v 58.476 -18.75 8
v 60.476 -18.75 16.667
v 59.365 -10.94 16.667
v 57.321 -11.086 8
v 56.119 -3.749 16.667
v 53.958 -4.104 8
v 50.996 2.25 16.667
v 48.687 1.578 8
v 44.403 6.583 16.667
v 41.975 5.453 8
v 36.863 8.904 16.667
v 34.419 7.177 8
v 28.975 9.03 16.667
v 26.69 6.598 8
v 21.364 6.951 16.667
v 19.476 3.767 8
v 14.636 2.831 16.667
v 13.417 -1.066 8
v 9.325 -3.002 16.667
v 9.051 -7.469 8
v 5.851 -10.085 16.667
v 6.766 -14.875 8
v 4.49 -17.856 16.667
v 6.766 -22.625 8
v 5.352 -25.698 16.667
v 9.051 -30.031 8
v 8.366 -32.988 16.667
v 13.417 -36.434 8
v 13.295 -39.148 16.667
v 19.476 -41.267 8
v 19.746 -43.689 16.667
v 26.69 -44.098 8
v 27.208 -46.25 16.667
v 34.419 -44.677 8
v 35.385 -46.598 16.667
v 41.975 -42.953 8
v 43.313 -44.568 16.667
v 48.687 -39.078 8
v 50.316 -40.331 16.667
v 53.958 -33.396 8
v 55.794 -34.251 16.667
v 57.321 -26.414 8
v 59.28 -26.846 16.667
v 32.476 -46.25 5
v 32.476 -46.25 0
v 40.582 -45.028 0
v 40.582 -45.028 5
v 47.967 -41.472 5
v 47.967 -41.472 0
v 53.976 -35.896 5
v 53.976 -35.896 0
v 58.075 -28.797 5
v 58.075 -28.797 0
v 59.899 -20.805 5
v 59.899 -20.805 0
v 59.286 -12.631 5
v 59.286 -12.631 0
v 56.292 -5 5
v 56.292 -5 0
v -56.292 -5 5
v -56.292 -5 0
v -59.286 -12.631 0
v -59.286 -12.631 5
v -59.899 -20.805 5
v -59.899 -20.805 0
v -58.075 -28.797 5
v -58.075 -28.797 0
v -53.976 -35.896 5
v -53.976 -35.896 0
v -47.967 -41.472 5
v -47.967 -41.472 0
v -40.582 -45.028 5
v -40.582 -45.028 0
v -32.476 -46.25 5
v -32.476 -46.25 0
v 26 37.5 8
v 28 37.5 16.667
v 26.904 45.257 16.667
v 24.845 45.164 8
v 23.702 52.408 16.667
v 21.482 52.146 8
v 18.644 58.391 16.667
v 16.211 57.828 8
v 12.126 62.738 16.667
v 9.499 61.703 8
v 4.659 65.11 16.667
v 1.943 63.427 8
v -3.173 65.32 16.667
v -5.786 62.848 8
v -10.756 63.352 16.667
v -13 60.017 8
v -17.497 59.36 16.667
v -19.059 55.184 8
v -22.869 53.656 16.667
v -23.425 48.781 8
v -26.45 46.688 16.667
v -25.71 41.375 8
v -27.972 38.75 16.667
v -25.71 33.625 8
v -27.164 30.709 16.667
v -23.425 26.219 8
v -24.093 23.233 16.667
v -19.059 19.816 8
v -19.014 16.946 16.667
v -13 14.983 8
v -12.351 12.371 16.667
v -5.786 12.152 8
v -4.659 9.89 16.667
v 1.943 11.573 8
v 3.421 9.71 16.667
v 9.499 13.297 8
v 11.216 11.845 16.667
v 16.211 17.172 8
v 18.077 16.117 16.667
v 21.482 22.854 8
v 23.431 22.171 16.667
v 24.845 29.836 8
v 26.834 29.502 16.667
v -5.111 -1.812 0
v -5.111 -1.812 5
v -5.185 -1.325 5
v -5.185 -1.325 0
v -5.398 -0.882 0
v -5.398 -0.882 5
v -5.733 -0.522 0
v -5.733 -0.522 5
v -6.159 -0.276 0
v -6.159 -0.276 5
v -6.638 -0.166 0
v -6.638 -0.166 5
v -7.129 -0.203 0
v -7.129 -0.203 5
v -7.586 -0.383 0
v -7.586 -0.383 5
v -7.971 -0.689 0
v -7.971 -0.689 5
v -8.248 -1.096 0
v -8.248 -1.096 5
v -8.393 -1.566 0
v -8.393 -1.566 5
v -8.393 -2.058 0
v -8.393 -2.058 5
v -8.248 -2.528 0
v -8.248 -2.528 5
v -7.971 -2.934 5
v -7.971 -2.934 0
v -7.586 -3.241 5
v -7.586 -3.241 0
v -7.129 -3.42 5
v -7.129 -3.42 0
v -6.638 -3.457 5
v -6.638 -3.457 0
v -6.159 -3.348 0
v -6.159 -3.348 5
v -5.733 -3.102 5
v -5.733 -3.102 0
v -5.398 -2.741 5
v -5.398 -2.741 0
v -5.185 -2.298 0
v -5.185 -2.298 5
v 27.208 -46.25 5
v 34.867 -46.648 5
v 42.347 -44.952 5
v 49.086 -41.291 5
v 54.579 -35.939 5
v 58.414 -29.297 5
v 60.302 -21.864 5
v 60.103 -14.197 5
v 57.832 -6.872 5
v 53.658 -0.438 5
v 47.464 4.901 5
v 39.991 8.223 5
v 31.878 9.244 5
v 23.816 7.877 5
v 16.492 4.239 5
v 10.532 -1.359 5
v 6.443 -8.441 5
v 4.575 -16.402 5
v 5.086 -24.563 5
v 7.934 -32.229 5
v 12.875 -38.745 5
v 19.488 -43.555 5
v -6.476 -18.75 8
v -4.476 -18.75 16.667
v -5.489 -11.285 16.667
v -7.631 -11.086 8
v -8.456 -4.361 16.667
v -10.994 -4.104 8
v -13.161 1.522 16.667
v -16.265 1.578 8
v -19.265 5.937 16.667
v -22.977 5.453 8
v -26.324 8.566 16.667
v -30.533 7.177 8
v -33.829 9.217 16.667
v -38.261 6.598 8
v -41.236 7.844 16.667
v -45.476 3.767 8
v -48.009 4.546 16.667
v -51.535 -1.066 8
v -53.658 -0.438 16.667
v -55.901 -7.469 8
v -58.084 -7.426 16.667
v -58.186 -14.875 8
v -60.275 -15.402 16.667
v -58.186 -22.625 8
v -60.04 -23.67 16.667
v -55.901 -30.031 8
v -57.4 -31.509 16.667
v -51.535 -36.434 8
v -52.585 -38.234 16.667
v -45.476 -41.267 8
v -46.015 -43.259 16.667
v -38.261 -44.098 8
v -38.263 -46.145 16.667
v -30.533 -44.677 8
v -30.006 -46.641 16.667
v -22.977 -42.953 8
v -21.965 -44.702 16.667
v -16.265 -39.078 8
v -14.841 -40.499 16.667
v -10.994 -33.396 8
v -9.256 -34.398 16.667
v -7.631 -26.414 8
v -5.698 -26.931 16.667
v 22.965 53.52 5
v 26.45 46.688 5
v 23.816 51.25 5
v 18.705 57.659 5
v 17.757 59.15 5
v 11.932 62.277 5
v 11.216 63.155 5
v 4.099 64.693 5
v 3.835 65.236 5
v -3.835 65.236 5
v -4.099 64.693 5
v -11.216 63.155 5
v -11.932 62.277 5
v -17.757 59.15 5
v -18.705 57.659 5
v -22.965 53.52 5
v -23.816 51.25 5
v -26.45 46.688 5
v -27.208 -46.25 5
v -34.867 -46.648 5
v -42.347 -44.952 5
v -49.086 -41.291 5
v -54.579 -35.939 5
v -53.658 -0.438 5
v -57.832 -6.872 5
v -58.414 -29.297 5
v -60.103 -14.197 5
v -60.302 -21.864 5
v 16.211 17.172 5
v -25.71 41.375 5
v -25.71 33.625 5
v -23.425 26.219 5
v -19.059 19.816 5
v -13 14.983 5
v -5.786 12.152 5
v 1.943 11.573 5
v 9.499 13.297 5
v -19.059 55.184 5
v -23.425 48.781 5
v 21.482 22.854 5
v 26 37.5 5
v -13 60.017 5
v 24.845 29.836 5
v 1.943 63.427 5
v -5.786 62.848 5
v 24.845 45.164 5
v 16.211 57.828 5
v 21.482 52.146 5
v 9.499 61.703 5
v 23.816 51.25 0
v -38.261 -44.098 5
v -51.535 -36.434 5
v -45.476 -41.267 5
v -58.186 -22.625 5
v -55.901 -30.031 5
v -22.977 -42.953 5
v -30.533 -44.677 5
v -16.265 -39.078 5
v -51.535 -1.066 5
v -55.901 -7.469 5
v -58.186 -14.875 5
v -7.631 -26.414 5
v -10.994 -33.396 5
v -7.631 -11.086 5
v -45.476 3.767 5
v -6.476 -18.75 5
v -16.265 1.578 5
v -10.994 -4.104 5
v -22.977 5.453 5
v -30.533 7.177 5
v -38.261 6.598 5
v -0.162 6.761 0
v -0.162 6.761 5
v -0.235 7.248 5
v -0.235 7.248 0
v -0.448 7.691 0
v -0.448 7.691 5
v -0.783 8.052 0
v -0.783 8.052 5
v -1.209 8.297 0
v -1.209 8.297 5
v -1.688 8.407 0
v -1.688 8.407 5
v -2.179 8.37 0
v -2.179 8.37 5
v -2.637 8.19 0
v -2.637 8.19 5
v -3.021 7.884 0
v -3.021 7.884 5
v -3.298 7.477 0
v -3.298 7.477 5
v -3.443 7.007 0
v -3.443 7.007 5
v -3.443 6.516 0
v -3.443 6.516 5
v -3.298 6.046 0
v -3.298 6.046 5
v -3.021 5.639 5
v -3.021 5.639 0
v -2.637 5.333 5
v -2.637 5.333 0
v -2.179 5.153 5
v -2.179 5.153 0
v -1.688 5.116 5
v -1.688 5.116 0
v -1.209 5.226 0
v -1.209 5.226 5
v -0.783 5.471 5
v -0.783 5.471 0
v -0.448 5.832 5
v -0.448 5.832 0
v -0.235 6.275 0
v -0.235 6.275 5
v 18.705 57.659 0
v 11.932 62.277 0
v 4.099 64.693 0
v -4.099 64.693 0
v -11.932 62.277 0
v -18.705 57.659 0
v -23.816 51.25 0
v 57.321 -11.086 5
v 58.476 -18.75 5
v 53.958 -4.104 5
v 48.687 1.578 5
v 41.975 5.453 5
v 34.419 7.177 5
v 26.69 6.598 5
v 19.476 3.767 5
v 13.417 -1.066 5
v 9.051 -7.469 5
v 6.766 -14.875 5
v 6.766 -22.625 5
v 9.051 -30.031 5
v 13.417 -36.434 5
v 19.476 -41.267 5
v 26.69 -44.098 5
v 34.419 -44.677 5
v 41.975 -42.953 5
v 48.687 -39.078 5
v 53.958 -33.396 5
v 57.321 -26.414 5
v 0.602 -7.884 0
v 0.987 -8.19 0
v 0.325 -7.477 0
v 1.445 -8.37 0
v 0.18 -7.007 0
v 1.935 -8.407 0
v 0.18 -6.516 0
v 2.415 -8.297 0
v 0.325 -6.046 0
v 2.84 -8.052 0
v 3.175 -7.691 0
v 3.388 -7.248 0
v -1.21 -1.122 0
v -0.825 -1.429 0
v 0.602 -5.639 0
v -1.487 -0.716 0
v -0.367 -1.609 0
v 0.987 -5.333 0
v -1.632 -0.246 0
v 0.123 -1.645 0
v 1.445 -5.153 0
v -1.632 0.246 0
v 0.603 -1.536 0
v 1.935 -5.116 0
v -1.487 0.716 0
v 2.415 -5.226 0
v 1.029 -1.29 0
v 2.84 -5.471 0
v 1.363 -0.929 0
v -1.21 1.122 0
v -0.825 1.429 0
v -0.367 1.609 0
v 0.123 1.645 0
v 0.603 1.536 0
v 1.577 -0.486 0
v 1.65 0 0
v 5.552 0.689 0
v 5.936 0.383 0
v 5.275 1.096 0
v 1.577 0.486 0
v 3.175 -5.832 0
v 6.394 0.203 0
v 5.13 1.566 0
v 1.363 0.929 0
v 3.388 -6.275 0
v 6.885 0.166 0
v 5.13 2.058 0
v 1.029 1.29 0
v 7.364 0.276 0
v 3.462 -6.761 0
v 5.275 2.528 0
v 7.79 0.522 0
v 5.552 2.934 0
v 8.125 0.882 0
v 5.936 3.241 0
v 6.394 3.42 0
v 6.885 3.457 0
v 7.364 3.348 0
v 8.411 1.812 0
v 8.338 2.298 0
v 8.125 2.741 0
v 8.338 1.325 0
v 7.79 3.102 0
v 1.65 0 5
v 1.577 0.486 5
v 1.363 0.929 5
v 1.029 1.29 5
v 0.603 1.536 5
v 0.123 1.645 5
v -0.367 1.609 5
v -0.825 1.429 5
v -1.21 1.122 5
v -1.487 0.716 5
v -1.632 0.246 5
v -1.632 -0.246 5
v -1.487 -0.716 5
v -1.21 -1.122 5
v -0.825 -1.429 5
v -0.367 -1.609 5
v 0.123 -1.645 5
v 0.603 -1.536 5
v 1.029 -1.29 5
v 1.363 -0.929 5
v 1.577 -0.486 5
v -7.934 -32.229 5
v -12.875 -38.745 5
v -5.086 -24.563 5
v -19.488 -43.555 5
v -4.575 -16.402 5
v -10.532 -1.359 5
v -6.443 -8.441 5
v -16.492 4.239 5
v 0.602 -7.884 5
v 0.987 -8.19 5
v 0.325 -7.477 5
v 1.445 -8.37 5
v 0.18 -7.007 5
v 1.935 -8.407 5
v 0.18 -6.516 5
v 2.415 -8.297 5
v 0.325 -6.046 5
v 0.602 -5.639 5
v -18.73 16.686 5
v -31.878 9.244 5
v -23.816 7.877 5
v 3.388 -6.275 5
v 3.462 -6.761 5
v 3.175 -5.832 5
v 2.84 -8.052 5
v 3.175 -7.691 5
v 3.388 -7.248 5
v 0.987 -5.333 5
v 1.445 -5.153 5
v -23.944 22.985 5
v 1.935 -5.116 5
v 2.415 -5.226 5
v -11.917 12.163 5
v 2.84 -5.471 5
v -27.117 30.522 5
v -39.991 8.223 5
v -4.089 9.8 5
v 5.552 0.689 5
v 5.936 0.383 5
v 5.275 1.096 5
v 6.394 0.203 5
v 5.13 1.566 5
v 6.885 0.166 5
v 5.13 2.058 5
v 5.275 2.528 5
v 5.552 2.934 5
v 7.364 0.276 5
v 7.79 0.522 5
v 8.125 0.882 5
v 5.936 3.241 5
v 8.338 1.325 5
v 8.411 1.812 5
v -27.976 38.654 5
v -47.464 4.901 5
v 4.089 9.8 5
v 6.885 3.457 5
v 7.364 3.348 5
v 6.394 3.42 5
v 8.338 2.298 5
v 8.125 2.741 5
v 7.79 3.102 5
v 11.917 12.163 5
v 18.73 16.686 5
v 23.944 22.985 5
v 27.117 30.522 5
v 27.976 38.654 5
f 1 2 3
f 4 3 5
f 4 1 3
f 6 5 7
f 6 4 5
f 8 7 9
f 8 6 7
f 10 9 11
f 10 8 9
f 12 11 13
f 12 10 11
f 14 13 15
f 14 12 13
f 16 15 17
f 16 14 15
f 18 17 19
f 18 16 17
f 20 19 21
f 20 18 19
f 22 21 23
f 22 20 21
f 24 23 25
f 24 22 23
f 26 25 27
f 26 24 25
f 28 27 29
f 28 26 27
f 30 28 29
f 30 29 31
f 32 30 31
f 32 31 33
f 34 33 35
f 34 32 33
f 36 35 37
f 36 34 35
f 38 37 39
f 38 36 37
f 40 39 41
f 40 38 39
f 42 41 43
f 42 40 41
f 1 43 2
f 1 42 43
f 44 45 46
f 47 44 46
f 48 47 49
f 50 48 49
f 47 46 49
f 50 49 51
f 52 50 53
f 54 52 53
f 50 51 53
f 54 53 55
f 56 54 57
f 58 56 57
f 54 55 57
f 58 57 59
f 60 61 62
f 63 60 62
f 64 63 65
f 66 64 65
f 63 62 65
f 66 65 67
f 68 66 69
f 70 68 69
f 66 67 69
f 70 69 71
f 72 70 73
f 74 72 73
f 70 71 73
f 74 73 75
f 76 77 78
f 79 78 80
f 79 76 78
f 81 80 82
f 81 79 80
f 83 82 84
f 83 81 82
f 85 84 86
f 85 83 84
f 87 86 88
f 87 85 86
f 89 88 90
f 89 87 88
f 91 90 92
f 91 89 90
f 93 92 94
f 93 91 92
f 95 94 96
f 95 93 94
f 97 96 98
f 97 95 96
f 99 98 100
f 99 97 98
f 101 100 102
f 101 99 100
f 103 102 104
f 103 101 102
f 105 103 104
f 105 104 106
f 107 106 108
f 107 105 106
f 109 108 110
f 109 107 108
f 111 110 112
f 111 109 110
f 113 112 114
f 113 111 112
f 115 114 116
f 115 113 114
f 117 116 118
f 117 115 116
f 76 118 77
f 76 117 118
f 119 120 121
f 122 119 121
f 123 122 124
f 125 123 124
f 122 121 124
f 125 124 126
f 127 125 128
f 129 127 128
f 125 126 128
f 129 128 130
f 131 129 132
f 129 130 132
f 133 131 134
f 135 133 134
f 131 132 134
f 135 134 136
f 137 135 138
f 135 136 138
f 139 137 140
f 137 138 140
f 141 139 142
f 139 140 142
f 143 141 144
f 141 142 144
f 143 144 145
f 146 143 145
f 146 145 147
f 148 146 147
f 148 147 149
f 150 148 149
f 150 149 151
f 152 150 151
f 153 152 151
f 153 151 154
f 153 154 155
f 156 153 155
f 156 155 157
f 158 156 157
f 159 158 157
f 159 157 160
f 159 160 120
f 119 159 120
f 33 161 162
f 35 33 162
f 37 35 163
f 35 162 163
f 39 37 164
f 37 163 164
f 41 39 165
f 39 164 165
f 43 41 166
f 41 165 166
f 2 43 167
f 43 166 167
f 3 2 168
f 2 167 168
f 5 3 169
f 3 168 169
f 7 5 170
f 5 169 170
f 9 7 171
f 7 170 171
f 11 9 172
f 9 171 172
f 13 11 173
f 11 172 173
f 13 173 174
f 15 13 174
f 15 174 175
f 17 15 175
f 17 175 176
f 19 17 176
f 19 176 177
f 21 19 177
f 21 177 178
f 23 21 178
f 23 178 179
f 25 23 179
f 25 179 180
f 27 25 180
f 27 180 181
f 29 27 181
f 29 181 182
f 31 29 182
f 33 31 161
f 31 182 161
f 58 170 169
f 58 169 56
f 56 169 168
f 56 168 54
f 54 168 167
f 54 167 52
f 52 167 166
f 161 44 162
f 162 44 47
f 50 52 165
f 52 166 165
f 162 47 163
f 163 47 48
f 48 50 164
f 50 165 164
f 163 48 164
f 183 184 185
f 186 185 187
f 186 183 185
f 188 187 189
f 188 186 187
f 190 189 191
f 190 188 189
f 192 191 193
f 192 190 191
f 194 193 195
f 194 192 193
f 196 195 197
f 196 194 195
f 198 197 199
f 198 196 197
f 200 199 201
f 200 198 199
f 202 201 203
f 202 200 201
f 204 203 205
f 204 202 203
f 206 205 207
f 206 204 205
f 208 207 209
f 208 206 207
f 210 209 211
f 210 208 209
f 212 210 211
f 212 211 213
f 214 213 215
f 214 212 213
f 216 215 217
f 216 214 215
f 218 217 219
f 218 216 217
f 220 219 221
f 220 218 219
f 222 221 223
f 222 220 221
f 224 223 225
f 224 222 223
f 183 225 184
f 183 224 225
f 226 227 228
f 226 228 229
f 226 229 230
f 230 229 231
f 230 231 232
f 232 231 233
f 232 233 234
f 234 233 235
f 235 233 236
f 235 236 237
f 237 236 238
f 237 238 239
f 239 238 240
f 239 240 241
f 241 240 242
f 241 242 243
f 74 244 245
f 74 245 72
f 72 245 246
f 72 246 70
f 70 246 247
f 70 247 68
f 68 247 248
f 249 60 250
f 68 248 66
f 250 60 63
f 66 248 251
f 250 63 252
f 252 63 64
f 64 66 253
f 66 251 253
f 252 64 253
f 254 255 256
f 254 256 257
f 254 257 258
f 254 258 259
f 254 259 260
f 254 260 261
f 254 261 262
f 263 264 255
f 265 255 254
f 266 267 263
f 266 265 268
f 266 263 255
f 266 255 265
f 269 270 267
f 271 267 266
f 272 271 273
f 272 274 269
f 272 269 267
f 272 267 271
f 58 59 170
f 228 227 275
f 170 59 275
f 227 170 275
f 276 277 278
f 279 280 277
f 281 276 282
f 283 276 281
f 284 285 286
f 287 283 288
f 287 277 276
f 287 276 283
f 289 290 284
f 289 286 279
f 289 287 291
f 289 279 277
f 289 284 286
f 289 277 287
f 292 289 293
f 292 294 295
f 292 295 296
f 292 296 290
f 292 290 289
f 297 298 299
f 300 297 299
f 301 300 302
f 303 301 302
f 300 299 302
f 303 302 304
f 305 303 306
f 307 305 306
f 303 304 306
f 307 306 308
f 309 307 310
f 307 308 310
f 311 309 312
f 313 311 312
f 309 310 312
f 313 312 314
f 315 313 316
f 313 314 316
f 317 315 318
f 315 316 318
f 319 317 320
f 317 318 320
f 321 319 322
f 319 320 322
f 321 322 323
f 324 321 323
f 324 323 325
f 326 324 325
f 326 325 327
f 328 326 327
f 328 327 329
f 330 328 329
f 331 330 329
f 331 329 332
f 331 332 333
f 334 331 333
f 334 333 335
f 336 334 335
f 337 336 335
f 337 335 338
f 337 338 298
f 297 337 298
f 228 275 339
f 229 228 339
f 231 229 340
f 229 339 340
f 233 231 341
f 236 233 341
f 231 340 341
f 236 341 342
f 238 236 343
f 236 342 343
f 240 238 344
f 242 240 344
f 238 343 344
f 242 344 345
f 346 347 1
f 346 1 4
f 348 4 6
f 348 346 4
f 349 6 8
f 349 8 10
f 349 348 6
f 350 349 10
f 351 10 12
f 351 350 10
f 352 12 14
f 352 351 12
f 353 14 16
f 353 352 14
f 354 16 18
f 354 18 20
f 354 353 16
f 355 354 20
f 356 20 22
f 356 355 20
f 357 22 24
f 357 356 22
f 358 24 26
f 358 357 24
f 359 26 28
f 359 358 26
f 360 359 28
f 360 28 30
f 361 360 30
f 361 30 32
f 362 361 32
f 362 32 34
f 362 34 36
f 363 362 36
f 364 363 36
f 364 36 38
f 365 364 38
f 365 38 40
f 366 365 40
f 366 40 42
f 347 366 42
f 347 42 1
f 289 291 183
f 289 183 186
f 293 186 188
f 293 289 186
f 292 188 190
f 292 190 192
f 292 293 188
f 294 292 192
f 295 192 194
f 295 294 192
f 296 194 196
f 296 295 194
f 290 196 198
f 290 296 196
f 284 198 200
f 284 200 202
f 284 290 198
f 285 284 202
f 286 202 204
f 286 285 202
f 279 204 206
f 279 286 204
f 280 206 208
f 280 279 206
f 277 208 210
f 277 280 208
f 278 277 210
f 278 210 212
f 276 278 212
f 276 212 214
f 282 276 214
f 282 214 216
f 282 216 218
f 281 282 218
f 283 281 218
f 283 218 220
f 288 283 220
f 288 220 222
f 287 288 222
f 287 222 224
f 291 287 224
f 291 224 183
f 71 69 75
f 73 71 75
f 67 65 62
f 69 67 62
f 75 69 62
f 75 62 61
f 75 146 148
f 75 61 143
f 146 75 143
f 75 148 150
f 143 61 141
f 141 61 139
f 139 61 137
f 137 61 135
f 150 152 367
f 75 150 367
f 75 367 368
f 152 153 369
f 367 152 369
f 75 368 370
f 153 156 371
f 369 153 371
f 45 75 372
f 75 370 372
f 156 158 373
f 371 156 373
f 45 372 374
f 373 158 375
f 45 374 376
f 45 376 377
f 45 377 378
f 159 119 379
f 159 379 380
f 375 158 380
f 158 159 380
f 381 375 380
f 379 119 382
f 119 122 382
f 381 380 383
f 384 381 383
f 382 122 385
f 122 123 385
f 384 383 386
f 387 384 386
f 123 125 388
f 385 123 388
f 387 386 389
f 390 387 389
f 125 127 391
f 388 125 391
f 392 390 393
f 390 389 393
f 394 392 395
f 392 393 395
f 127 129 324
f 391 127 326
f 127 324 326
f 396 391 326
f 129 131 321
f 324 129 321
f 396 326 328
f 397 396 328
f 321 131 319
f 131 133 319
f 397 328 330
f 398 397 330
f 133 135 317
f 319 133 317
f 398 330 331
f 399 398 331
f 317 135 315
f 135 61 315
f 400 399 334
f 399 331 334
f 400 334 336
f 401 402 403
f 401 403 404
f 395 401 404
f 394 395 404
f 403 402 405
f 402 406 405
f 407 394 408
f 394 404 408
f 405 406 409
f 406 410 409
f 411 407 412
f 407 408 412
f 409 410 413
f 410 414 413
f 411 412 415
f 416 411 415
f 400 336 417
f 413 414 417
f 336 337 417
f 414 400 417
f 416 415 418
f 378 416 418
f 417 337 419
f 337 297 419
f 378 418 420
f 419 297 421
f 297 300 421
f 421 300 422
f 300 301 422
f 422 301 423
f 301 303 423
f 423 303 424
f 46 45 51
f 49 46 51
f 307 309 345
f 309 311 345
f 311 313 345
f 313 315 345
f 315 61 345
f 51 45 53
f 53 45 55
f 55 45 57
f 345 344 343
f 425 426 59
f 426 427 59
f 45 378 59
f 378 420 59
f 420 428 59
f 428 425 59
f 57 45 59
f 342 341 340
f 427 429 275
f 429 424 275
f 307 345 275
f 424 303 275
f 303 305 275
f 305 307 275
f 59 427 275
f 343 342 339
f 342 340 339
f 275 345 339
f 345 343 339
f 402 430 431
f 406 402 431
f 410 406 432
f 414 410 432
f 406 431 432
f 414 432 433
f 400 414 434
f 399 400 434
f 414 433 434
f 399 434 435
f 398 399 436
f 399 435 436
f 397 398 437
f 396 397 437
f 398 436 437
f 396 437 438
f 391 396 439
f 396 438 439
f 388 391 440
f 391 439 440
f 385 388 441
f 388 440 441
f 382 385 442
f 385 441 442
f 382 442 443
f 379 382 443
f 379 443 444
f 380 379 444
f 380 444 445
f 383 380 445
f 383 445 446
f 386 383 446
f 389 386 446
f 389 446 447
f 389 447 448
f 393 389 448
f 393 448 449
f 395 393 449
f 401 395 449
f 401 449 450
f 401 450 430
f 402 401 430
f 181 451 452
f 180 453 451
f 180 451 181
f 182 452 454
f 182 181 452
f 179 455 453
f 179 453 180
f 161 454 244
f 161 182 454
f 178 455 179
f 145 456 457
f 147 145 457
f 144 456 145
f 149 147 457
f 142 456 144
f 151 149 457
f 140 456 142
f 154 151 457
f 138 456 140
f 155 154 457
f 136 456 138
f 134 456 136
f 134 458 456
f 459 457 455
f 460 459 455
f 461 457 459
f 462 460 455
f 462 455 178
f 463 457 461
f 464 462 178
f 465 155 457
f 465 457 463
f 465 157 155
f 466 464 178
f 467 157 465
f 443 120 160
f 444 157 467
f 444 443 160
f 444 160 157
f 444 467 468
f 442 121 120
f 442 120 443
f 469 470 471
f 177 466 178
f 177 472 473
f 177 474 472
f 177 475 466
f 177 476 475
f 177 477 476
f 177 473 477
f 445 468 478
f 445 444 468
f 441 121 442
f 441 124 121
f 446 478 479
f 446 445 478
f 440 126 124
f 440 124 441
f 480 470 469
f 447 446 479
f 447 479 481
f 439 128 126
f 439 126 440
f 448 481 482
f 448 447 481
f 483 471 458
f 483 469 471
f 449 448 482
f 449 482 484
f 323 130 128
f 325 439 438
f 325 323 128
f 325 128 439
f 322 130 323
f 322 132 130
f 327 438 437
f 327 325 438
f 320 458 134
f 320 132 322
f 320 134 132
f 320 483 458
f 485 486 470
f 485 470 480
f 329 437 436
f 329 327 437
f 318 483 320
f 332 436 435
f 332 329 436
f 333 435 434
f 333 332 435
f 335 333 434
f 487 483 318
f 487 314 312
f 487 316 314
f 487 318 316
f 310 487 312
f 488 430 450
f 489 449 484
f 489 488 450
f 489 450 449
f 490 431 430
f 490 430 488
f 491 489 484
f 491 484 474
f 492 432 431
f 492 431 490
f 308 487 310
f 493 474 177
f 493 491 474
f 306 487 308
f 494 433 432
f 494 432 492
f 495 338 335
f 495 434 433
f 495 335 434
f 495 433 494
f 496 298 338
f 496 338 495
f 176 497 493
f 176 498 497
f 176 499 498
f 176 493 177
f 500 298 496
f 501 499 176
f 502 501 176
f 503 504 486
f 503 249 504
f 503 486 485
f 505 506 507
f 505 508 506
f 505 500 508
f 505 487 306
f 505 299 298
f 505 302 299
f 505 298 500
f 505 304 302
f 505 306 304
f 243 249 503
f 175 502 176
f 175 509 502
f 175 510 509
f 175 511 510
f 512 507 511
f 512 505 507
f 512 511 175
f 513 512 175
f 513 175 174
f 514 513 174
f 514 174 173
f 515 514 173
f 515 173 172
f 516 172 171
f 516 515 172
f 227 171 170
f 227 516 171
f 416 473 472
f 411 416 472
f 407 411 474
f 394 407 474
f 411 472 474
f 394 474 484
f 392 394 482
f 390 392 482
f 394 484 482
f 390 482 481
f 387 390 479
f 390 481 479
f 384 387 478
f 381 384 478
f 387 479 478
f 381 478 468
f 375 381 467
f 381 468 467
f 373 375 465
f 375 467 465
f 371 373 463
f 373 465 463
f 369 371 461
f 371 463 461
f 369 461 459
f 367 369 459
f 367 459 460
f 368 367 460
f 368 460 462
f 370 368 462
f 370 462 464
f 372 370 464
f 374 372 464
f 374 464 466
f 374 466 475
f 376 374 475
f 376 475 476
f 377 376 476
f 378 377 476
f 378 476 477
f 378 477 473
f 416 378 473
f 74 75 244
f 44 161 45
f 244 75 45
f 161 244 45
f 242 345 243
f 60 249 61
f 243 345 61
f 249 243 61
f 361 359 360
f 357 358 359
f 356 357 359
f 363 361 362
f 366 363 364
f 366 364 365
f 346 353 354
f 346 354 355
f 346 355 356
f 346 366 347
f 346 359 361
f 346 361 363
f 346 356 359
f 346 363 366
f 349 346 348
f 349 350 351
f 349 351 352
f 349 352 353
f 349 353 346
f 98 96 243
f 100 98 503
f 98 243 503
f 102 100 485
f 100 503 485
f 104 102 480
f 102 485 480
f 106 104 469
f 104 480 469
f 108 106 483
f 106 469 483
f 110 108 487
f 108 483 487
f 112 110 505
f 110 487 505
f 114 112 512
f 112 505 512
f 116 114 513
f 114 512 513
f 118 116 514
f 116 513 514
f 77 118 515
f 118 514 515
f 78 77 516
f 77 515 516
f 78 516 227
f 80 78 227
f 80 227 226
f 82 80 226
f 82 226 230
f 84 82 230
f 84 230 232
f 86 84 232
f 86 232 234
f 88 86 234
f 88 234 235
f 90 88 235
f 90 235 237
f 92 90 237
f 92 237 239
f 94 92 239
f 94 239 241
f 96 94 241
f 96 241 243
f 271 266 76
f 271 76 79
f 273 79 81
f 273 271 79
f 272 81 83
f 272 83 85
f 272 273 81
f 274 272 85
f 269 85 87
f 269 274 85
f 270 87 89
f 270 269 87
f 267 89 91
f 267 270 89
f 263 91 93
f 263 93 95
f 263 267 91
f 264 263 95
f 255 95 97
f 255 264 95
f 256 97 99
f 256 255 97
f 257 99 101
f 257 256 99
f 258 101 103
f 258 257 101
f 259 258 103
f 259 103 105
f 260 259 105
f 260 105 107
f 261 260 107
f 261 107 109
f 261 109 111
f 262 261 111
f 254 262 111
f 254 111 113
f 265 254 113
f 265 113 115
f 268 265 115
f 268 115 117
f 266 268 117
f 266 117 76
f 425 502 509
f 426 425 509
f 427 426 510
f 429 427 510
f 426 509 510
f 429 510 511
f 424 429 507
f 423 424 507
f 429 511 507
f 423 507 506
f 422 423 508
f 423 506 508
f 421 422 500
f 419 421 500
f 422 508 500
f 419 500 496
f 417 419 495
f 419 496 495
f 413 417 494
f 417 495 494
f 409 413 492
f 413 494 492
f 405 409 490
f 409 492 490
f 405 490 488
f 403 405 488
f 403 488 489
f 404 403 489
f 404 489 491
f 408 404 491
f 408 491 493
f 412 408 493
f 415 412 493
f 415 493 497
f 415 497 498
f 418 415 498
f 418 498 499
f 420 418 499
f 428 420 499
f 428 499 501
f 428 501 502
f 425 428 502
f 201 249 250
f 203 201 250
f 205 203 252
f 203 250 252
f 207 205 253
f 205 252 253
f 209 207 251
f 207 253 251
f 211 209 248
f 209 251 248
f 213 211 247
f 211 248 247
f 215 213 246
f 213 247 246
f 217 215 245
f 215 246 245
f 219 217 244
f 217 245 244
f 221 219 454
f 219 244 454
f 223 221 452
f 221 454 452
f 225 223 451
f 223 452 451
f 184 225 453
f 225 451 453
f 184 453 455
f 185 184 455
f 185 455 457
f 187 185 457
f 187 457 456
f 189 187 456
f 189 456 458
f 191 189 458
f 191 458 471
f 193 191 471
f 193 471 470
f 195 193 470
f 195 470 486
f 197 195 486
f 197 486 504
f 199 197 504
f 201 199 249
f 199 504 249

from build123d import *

# Parameters (mm, degrees)
EXTRUDE_1_DEPTH     = 5
SKETCH_2_R          = 28
SKETCH_2_R_2        = 26
EXTRUDE_2_DEPTH     = 16
SKETCH_3_R          = 1.65
CUT_EXTRUDE_1_DEPTH = 91.573676352
CHAMFER_1_SIZE      = 3
CHAMFER_1_SIZE_2    = 13


with BuildPart() as part:
    # 草图1 → 凸台-拉伸1 (new body)
    with BuildSketch(Plane.XY):
        with BuildLine():
            Line((-23.815698604, 51.25), (-56.291651246, -5))
            ThreePointArc((-56.291651246, -5), (-56.291651246, -32.5), (-32.475952642, -46.25))
            Line((-32.475952642, -46.25), (32.475952642, -46.25))
            ThreePointArc((32.475952642, -46.25), (56.291651246, -32.5), (56.291651246, -5))
            Line((56.291651246, -5), (23.815698604, 51.25))
            ThreePointArc((23.815698604, 51.25), (0, 65), (-23.815698604, 51.25))
        make_face()
    extrude(amount=EXTRUDE_1_DEPTH)

    # 草图2 → 凸台-拉伸2 (add)
    # profile 1 of 3: a face of its own
    with BuildSketch(Plane.XY.offset(5)):
        with Locations(Location((0, 37.5, 0), (0, 0, 160.844062564))):
            Circle(SKETCH_2_R)
        with Locations((0, 37.5)):
            Circle(SKETCH_2_R_2, mode=Mode.SUBTRACT)
    # profile 2 of 3: a face of its own
    with BuildSketch(Plane.XY.offset(5)):
        with Locations(Location((32.475952642, -18.75, 0), (0, 0, 259.155937436))):
            Circle(SKETCH_2_R)
        with Locations((32.475952642, -18.75)):
            Circle(SKETCH_2_R_2, mode=Mode.SUBTRACT)
    # profile 3 of 3: a face of its own
    with BuildSketch(Plane.XY.offset(5)):
        with Locations(Location((-32.475952642, -18.75, 0), (0, 0, 139.155937436))):
            Circle(SKETCH_2_R)
        with Locations((-32.475952642, -18.75)):
            Circle(SKETCH_2_R_2, mode=Mode.SUBTRACT)
    extrude(amount=EXTRUDE_2_DEPTH)

    # 草图3 → 切除-拉伸1 (cut, through all)
    with BuildSketch(Plane.XY.offset(5)):
        Circle(SKETCH_3_R)
        with Locations((-1.811733316, 6.761480784)):
            Circle(SKETCH_3_R)
        with Locations((6.761480784, 1.811733316)):
            Circle(SKETCH_3_R)
        with Locations((1.811733316, -6.761480784)):
            Circle(SKETCH_3_R)
        with Locations((-6.761480784, -1.811733316)):
            Circle(SKETCH_3_R)
    extrude(amount=-CUT_EXTRUDE_1_DEPTH, mode=Mode.SUBTRACT)

    # 倒角1
    # the kernel refuses this chamfer: 13, 3 mm, written as the material it takes off along each edge
    with BuildSketch(Plane(origin=(-32.475952642, -18.75, 21), x_dir=(1, 0, 0), z_dir=(0, -1, 0))) as chamfer_1_piece_1:
        Polygon((26 + CHAMFER_1_SIZE, 0), (26, -CHAMFER_1_SIZE_2), (26, 0), align=None)
    revolve(axis=Axis((-32.475952642, -18.75, 21), (0, 0, 1)), mode=Mode.SUBTRACT)
    with BuildSketch(Plane(origin=(32.475952642, -18.75, 21), x_dir=(1, 0, 0), z_dir=(0, -1, 0))) as chamfer_1_piece_2:
        Polygon((26 + CHAMFER_1_SIZE, 0), (26, -CHAMFER_1_SIZE_2), (26, 0), align=None)
    revolve(axis=Axis((32.475952642, -18.75, 21), (0, 0, 1)), mode=Mode.SUBTRACT)
    with BuildSketch(Plane(origin=(0, 37.5, 21), x_dir=(1, 0, 0), z_dir=(0, -1, 0))) as chamfer_1_piece_3:
        Polygon((26 + CHAMFER_1_SIZE, 0), (26, -CHAMFER_1_SIZE_2), (26, 0), align=None)
    revolve(axis=Axis((0, 37.5, 21), (0, 0, 1)), mode=Mode.SUBTRACT)


solid = part.part
